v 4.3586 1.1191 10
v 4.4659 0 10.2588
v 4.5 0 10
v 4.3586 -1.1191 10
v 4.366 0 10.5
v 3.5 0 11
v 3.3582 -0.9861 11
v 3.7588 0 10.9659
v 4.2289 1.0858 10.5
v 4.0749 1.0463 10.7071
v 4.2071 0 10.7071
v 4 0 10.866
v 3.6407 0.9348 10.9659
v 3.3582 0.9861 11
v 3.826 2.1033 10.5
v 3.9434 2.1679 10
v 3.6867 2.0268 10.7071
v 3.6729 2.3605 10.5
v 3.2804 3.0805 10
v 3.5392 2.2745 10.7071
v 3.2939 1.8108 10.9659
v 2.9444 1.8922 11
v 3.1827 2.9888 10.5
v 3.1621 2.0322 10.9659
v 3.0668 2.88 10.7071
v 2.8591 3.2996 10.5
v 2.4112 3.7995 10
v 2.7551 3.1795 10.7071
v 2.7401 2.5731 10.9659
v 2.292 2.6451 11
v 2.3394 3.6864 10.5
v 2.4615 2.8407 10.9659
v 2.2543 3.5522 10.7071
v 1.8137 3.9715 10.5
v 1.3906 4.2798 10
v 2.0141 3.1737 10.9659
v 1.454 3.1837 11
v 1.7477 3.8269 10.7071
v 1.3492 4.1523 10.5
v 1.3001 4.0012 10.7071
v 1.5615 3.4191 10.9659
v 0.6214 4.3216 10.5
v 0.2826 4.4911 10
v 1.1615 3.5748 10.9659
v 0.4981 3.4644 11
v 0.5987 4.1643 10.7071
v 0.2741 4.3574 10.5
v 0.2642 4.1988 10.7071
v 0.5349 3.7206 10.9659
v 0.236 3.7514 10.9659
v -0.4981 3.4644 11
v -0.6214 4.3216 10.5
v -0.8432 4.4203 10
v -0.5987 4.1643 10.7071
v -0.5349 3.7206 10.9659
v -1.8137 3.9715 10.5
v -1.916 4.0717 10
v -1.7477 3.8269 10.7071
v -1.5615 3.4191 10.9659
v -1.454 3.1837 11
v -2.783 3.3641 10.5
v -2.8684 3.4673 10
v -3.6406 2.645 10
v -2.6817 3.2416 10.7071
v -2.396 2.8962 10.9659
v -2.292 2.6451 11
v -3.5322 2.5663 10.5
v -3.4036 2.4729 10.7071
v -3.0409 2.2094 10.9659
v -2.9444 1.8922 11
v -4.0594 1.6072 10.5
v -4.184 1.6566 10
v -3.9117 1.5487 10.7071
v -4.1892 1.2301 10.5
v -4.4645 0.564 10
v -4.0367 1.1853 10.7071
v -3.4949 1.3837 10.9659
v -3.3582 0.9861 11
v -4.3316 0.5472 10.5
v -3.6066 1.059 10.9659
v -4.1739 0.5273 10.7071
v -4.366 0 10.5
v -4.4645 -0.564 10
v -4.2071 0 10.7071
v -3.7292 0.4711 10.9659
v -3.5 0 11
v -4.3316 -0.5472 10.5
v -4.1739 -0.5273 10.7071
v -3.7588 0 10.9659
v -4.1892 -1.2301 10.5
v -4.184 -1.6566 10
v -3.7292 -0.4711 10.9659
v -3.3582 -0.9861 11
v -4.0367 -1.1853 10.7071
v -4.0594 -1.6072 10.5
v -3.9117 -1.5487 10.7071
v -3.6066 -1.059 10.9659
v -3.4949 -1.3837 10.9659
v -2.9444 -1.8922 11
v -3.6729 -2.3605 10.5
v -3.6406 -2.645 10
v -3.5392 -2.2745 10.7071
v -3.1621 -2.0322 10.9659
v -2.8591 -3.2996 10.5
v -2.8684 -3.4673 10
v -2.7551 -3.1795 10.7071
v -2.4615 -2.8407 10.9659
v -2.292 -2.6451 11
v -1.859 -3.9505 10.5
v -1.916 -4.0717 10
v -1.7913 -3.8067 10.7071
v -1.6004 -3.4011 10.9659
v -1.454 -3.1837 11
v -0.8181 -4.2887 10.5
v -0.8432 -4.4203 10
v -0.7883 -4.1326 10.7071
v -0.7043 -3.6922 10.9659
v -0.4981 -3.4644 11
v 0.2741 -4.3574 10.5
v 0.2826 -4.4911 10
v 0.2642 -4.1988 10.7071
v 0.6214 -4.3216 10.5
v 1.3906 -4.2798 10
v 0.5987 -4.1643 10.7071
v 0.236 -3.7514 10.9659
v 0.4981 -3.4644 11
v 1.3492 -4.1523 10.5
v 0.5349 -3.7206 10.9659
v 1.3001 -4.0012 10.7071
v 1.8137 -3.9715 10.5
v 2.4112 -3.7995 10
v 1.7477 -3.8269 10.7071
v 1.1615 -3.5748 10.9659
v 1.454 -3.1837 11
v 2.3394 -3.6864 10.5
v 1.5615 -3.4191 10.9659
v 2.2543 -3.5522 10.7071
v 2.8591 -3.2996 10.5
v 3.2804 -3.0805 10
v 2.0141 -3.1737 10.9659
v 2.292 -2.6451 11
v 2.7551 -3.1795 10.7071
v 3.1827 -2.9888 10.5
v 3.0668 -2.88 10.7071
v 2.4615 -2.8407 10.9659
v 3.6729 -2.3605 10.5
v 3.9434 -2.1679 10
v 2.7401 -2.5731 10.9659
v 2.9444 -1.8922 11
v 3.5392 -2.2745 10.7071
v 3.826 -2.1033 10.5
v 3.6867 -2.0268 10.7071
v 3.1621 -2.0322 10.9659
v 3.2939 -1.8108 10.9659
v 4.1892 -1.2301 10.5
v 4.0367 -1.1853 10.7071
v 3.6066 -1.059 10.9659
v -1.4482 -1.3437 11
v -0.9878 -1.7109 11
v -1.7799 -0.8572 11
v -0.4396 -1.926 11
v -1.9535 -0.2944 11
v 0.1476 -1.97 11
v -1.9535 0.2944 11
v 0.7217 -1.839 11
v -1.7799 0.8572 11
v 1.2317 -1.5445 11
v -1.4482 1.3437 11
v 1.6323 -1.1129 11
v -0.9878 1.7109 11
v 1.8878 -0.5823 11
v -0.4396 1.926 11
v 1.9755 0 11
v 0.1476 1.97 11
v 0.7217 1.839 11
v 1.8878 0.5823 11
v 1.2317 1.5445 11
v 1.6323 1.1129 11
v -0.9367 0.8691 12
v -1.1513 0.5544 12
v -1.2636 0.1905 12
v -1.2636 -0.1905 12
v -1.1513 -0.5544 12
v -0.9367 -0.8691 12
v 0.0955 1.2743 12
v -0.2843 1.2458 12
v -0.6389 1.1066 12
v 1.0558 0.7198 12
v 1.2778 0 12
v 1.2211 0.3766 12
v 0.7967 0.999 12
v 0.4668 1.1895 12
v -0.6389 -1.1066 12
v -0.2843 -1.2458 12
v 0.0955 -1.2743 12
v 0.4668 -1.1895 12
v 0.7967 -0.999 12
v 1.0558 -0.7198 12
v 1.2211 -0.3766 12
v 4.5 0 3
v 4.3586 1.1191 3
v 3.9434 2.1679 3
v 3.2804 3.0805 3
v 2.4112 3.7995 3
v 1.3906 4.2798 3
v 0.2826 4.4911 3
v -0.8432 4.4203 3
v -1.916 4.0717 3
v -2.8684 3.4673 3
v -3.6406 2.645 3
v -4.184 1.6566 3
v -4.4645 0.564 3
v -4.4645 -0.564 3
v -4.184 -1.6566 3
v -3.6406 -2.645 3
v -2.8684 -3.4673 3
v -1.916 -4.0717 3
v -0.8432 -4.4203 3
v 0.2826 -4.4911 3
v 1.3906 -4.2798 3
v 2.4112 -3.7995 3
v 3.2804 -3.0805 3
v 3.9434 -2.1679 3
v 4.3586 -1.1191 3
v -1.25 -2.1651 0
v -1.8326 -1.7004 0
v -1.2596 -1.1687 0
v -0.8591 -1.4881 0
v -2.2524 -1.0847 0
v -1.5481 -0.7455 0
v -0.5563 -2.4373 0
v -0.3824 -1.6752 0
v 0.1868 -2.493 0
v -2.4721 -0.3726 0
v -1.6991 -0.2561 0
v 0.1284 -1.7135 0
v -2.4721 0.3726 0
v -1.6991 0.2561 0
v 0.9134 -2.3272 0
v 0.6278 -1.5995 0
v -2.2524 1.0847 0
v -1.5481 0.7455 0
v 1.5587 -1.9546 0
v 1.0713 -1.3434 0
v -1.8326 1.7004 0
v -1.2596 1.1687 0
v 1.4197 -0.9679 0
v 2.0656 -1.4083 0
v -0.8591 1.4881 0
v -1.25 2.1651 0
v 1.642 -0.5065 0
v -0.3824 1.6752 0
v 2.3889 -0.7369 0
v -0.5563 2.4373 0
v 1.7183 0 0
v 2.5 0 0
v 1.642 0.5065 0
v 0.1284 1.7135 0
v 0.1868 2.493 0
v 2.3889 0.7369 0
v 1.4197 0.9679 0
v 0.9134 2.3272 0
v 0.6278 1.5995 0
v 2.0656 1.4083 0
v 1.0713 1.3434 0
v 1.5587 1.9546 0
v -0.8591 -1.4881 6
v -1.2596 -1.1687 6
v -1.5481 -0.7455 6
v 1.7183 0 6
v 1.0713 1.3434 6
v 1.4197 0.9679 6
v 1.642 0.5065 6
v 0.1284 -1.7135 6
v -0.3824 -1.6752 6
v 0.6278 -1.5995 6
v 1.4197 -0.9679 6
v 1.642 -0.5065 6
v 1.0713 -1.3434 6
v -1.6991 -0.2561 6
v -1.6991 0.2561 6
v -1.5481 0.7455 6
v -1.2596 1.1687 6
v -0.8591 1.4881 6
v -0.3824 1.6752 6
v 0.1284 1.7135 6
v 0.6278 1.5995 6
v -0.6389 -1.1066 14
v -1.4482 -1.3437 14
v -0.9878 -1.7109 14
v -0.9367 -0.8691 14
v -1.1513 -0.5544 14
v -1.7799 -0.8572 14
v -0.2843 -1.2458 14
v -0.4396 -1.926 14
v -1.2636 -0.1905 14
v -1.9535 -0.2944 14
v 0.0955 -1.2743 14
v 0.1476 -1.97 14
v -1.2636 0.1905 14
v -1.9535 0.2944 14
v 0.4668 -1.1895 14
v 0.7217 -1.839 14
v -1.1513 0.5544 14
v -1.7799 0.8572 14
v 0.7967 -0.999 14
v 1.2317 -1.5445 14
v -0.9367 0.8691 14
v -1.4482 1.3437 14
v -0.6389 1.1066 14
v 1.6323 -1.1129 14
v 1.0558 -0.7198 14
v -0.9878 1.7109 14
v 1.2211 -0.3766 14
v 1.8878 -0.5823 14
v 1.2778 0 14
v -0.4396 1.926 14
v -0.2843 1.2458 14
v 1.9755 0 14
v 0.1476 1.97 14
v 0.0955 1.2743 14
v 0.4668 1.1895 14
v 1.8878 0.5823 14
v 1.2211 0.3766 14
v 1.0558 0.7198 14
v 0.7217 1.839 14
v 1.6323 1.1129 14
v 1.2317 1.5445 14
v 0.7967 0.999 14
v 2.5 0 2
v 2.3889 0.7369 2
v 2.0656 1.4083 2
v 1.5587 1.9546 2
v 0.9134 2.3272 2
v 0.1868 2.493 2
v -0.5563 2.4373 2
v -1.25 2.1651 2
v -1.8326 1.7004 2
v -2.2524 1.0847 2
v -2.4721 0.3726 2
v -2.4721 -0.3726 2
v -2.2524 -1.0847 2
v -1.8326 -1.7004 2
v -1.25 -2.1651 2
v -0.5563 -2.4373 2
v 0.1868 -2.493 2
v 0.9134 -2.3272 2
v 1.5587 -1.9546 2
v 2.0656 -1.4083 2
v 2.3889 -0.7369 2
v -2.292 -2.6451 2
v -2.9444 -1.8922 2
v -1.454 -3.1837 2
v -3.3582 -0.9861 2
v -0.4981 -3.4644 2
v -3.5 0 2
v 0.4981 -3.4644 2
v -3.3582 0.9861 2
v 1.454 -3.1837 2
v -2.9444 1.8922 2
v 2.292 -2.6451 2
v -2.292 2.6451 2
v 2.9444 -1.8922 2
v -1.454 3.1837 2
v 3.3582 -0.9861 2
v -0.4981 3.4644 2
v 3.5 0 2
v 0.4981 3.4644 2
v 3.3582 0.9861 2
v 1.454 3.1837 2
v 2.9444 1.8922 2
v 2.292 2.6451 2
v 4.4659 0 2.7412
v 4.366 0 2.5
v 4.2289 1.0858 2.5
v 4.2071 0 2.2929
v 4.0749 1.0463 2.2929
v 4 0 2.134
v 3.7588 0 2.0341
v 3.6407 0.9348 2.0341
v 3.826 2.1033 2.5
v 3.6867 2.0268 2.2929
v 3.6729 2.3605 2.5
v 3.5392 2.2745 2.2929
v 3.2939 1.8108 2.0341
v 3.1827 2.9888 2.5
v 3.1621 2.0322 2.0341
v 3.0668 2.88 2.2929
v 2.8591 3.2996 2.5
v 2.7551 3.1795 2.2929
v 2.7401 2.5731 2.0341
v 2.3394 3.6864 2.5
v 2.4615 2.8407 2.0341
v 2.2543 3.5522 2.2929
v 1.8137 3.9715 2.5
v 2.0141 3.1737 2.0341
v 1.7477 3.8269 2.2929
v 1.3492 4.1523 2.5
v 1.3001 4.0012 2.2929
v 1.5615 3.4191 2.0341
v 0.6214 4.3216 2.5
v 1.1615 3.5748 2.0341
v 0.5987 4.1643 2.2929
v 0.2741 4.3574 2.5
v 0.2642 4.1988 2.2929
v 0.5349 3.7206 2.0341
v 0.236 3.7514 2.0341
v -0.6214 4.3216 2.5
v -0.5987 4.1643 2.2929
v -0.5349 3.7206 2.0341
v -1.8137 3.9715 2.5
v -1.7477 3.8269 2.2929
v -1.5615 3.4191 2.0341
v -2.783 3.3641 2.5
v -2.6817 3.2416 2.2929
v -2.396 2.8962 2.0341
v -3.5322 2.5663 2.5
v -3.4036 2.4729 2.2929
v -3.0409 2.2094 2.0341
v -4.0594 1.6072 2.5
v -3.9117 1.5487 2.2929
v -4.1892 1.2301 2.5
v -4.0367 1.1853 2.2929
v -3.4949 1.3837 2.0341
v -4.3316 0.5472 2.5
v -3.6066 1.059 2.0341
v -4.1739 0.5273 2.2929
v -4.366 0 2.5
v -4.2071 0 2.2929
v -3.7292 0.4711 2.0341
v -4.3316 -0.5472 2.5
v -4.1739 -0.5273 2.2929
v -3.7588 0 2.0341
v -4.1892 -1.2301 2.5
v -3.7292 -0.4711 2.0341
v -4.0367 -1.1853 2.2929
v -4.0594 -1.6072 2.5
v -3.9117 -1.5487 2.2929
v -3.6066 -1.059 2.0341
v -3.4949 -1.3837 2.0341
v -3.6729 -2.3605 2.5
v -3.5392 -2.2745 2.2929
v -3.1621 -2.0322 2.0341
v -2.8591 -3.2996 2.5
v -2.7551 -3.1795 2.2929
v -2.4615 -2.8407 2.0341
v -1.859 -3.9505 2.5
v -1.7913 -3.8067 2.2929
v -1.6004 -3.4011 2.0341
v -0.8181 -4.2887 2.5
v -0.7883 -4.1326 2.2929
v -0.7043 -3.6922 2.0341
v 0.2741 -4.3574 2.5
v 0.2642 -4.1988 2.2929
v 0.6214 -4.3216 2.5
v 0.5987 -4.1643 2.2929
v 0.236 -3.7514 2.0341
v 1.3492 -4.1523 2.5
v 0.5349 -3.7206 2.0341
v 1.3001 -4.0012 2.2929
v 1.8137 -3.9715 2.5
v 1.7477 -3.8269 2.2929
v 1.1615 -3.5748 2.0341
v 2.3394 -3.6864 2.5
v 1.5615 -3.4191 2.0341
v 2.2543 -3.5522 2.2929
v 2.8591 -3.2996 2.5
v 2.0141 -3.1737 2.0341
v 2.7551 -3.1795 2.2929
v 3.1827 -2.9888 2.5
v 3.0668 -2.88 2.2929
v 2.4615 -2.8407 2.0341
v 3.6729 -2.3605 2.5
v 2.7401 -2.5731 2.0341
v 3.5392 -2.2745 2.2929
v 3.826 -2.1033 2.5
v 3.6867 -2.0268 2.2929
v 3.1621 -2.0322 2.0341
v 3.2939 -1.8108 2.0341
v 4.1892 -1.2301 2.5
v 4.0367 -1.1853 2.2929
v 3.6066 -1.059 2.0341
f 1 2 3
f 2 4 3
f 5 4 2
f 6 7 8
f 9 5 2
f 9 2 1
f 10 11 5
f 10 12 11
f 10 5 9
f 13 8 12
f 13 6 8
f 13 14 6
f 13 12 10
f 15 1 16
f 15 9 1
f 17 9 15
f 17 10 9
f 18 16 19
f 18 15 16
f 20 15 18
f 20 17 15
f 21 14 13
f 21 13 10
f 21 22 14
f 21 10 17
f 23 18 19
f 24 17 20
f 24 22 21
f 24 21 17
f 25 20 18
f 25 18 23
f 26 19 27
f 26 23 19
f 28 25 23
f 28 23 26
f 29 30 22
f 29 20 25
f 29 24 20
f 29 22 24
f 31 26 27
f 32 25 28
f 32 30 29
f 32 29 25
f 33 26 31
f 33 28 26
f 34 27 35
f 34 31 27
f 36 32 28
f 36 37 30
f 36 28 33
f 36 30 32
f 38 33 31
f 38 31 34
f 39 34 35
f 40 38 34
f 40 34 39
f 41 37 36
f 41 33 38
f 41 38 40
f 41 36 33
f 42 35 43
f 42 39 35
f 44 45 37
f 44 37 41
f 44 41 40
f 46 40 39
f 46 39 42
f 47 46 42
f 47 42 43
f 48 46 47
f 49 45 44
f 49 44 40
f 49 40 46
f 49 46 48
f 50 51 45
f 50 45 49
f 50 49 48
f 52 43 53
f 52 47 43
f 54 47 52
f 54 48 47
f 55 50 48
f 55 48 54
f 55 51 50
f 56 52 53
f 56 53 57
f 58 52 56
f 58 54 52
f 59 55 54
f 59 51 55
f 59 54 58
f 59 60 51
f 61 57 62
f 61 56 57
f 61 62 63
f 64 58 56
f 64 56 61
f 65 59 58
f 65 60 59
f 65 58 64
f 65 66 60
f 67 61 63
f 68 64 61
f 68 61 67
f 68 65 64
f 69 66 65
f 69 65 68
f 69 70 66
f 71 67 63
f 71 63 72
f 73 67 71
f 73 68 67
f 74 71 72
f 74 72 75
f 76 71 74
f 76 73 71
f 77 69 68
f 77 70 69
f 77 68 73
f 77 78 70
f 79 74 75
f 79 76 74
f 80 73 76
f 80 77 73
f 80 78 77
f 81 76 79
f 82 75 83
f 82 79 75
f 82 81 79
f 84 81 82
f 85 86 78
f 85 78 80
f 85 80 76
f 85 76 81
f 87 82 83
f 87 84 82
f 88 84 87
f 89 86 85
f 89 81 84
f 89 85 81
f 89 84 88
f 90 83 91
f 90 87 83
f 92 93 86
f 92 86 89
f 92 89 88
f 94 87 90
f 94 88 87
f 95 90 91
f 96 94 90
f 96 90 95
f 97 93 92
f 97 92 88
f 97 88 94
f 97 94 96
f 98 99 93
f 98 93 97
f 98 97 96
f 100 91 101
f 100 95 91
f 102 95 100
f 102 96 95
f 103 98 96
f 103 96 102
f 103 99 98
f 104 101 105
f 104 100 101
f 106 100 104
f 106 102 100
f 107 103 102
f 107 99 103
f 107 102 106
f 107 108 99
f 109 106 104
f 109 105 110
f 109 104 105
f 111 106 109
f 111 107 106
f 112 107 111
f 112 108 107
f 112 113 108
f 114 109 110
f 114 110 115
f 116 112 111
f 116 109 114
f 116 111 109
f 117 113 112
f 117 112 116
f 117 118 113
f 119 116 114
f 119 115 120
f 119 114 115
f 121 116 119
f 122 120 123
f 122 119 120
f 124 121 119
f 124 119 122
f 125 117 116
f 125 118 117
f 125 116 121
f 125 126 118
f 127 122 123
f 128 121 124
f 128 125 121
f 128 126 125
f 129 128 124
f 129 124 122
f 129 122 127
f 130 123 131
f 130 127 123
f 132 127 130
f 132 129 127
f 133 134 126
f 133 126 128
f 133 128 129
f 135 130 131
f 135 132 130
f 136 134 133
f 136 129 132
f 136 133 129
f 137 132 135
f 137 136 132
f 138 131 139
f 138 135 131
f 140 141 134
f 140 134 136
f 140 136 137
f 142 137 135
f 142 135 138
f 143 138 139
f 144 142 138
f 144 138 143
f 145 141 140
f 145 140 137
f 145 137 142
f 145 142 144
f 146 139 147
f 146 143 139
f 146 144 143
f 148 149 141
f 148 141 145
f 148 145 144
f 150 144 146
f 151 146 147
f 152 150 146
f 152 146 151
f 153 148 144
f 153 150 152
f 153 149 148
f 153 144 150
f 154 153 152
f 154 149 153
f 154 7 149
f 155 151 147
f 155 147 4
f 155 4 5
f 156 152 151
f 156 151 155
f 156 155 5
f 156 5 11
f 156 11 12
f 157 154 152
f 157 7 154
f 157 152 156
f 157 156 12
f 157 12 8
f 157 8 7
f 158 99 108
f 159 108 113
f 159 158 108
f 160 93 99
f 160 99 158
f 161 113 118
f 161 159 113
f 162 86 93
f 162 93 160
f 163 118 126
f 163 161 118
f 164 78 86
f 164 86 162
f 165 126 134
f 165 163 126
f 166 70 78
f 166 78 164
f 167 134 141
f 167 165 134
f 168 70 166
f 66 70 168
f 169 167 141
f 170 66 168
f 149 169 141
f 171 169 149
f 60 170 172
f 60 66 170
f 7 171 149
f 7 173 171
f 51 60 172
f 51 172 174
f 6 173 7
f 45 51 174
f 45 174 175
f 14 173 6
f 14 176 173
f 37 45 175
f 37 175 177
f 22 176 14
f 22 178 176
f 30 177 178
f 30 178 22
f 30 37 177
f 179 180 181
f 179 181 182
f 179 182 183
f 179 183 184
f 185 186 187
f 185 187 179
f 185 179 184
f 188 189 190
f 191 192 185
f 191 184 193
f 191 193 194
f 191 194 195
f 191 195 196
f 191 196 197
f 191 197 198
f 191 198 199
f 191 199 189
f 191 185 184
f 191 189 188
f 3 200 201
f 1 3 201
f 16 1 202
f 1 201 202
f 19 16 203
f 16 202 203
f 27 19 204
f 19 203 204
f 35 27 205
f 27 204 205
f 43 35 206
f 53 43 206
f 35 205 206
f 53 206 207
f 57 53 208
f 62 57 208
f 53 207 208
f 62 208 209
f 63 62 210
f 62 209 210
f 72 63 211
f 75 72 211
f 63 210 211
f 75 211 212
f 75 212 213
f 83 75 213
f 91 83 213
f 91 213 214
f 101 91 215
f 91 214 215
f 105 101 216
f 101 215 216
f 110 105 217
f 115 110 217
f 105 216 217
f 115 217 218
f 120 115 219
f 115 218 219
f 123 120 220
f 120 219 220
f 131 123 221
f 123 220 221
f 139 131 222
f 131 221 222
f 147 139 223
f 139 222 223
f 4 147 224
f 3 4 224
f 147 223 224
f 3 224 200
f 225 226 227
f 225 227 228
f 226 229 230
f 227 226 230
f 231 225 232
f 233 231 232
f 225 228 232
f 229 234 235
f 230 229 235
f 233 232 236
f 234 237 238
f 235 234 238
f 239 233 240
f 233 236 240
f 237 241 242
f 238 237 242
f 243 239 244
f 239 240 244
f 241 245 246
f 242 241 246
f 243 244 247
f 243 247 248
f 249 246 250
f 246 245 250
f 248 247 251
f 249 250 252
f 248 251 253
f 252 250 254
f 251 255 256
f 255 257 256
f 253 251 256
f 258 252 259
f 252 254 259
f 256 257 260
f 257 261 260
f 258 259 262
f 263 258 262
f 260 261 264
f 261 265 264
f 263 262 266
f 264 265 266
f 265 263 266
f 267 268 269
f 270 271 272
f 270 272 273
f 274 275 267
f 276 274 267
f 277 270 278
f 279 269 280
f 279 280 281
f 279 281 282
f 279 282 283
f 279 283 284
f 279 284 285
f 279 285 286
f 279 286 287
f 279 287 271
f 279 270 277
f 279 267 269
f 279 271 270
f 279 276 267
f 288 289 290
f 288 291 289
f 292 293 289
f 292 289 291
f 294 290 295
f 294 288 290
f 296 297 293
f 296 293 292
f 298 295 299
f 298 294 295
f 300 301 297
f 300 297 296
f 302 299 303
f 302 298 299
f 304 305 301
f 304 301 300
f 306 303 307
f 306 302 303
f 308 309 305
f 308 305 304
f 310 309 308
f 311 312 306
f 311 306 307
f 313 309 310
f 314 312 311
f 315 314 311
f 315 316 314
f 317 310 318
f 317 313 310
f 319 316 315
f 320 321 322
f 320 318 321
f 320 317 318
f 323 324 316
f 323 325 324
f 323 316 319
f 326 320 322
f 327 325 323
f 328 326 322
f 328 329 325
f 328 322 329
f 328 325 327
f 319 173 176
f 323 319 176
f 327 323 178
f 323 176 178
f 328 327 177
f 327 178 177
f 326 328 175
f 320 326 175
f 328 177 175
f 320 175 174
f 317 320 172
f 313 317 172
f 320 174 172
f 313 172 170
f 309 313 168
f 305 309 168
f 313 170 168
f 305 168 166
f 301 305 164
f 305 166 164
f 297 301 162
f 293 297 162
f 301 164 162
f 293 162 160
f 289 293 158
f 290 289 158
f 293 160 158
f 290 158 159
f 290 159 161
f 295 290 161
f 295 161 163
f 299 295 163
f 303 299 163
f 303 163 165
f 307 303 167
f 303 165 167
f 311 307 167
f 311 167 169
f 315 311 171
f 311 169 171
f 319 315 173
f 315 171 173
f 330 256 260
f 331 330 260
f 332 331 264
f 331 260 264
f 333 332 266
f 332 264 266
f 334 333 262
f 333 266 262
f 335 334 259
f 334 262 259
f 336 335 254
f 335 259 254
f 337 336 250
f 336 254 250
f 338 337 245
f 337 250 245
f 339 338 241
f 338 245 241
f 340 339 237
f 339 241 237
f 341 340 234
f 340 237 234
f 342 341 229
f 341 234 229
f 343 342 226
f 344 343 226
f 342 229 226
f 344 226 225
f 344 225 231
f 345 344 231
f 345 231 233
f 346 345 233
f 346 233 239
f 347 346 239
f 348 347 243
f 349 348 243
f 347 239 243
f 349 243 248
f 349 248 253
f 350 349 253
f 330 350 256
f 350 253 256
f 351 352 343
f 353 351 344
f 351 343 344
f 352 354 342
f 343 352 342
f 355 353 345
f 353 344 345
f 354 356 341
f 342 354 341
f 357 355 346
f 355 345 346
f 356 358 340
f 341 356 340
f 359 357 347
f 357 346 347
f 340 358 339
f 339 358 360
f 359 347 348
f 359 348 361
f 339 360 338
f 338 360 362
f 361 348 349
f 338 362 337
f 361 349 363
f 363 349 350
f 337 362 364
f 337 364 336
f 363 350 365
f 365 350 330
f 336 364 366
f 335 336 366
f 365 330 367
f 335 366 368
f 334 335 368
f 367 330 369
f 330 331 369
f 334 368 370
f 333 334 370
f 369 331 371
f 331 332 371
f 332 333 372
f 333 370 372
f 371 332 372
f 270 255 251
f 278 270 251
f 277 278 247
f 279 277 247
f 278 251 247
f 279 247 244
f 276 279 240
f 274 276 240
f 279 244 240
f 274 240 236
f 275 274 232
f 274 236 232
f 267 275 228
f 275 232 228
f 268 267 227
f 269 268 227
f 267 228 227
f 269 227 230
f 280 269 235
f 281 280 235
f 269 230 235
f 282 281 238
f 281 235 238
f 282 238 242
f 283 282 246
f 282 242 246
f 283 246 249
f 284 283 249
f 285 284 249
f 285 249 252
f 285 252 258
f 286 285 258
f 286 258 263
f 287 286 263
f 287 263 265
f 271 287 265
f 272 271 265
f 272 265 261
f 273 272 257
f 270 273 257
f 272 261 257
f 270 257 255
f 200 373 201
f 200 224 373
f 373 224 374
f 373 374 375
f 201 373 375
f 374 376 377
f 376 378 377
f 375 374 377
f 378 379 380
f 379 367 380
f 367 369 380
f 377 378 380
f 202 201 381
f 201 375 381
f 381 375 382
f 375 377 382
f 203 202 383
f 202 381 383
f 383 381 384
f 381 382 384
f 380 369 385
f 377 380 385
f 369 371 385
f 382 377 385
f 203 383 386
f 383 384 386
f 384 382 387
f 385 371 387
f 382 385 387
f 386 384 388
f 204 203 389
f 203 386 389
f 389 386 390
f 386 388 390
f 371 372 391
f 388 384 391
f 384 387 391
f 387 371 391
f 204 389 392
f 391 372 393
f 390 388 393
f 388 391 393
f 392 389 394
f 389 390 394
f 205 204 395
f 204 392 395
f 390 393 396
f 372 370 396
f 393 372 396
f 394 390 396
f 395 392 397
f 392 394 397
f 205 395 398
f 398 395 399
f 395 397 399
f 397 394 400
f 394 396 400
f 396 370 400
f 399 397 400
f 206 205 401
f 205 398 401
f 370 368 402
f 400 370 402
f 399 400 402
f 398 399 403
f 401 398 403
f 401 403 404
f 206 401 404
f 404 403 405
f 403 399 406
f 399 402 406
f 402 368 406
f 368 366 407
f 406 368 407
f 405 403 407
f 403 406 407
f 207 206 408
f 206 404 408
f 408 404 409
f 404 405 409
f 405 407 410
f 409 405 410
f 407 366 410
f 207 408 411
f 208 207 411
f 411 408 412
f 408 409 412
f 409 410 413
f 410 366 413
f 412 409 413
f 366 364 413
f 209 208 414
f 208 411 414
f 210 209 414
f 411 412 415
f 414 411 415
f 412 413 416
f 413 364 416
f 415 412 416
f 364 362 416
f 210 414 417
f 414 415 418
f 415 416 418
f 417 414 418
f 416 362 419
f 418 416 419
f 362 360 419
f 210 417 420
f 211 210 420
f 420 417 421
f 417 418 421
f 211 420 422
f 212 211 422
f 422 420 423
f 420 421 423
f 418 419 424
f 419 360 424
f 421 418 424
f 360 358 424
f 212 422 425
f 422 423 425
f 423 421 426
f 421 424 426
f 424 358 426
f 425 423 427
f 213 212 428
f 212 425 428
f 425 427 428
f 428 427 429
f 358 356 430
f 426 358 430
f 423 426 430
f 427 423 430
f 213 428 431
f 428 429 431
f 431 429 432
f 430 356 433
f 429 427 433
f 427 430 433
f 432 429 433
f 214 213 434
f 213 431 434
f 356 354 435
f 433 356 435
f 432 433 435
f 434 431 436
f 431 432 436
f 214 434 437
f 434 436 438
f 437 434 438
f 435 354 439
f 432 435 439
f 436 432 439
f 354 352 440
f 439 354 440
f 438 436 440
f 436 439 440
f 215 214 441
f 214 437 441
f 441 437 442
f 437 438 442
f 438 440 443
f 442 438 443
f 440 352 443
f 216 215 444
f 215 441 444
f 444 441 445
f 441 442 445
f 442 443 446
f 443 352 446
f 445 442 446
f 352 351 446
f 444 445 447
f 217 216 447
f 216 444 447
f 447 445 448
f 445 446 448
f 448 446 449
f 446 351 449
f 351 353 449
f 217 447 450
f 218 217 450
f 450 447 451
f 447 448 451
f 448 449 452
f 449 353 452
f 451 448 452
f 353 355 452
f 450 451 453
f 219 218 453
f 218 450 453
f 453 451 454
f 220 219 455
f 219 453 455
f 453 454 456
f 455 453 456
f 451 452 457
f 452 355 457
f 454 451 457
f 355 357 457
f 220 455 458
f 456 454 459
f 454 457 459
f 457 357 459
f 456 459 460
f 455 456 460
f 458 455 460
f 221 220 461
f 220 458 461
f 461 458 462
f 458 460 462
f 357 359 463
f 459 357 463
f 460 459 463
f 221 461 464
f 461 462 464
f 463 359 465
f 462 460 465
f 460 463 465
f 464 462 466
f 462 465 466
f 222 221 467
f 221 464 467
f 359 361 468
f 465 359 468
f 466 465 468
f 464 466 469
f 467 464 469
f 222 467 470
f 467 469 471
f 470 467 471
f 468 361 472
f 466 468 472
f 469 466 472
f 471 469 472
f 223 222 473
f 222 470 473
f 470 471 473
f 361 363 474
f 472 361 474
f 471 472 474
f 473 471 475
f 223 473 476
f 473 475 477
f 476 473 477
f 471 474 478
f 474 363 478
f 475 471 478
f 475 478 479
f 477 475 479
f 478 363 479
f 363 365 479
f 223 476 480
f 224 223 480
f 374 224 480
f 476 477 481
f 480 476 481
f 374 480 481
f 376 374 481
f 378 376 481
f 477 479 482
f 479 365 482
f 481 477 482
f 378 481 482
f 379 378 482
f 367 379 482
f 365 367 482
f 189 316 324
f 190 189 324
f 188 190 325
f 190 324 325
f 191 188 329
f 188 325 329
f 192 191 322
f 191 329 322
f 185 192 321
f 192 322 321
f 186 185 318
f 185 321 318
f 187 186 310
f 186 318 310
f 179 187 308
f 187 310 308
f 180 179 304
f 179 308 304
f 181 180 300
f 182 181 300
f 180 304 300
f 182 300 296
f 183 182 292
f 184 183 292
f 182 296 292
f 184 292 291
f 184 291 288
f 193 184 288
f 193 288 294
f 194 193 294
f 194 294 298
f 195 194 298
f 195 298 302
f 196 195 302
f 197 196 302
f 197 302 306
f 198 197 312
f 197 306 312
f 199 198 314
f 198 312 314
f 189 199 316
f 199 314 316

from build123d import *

# Parameters (mm, degrees)
F0_R      = 2.5
F1_DEPTH  = 2
F2_R      = 4.5
F3_DEPTH  = 9
F4_R      = 1.718291
F5_DEPTH  = 6
F6_R      = 1
F7_R      = 1.975543
F8_DEPTH  = 3
F9_R      = 1.277831
F10_DEPTH = 2


with BuildPart() as f1:
    # F0 (on Top) → F1 (new body)
    with BuildSketch(Plane.XY):
        Circle(F0_R)
    extrude(amount=F1_DEPTH)

    # F2 (on face) → F3 (join)
    with BuildSketch(Plane.XY.offset(2)):
        Circle(F2_R)
    extrude(amount=F3_DEPTH)

    # F4 (on face) → F5 (cut)
    with BuildSketch(Plane(origin=(0, 0, 0), x_dir=(1, 0, 0), z_dir=(0, 0, -1))):
        Circle(F4_R)
    extrude(amount=-F5_DEPTH, mode=Mode.SUBTRACT)

    # F6
    f6_edges = [f1.edges().sort_by_distance(p)[0] for p in [
        (-4.5, 0, 11),
        (-4.5, 0, 2),
    ]]
    fillet(f6_edges, radius=F6_R)

    # F7 (on face) → F8 (join)
    with BuildSketch(Plane.XY.offset(11)):
        Circle(F7_R)
    extrude(amount=F8_DEPTH)

    # F9 (on face) → F10 (cut)
    with BuildSketch(Plane.XY.offset(14)):
        Circle(F9_R)
    extrude(amount=-F10_DEPTH, mode=Mode.SUBTRACT)


solid = f1.part
